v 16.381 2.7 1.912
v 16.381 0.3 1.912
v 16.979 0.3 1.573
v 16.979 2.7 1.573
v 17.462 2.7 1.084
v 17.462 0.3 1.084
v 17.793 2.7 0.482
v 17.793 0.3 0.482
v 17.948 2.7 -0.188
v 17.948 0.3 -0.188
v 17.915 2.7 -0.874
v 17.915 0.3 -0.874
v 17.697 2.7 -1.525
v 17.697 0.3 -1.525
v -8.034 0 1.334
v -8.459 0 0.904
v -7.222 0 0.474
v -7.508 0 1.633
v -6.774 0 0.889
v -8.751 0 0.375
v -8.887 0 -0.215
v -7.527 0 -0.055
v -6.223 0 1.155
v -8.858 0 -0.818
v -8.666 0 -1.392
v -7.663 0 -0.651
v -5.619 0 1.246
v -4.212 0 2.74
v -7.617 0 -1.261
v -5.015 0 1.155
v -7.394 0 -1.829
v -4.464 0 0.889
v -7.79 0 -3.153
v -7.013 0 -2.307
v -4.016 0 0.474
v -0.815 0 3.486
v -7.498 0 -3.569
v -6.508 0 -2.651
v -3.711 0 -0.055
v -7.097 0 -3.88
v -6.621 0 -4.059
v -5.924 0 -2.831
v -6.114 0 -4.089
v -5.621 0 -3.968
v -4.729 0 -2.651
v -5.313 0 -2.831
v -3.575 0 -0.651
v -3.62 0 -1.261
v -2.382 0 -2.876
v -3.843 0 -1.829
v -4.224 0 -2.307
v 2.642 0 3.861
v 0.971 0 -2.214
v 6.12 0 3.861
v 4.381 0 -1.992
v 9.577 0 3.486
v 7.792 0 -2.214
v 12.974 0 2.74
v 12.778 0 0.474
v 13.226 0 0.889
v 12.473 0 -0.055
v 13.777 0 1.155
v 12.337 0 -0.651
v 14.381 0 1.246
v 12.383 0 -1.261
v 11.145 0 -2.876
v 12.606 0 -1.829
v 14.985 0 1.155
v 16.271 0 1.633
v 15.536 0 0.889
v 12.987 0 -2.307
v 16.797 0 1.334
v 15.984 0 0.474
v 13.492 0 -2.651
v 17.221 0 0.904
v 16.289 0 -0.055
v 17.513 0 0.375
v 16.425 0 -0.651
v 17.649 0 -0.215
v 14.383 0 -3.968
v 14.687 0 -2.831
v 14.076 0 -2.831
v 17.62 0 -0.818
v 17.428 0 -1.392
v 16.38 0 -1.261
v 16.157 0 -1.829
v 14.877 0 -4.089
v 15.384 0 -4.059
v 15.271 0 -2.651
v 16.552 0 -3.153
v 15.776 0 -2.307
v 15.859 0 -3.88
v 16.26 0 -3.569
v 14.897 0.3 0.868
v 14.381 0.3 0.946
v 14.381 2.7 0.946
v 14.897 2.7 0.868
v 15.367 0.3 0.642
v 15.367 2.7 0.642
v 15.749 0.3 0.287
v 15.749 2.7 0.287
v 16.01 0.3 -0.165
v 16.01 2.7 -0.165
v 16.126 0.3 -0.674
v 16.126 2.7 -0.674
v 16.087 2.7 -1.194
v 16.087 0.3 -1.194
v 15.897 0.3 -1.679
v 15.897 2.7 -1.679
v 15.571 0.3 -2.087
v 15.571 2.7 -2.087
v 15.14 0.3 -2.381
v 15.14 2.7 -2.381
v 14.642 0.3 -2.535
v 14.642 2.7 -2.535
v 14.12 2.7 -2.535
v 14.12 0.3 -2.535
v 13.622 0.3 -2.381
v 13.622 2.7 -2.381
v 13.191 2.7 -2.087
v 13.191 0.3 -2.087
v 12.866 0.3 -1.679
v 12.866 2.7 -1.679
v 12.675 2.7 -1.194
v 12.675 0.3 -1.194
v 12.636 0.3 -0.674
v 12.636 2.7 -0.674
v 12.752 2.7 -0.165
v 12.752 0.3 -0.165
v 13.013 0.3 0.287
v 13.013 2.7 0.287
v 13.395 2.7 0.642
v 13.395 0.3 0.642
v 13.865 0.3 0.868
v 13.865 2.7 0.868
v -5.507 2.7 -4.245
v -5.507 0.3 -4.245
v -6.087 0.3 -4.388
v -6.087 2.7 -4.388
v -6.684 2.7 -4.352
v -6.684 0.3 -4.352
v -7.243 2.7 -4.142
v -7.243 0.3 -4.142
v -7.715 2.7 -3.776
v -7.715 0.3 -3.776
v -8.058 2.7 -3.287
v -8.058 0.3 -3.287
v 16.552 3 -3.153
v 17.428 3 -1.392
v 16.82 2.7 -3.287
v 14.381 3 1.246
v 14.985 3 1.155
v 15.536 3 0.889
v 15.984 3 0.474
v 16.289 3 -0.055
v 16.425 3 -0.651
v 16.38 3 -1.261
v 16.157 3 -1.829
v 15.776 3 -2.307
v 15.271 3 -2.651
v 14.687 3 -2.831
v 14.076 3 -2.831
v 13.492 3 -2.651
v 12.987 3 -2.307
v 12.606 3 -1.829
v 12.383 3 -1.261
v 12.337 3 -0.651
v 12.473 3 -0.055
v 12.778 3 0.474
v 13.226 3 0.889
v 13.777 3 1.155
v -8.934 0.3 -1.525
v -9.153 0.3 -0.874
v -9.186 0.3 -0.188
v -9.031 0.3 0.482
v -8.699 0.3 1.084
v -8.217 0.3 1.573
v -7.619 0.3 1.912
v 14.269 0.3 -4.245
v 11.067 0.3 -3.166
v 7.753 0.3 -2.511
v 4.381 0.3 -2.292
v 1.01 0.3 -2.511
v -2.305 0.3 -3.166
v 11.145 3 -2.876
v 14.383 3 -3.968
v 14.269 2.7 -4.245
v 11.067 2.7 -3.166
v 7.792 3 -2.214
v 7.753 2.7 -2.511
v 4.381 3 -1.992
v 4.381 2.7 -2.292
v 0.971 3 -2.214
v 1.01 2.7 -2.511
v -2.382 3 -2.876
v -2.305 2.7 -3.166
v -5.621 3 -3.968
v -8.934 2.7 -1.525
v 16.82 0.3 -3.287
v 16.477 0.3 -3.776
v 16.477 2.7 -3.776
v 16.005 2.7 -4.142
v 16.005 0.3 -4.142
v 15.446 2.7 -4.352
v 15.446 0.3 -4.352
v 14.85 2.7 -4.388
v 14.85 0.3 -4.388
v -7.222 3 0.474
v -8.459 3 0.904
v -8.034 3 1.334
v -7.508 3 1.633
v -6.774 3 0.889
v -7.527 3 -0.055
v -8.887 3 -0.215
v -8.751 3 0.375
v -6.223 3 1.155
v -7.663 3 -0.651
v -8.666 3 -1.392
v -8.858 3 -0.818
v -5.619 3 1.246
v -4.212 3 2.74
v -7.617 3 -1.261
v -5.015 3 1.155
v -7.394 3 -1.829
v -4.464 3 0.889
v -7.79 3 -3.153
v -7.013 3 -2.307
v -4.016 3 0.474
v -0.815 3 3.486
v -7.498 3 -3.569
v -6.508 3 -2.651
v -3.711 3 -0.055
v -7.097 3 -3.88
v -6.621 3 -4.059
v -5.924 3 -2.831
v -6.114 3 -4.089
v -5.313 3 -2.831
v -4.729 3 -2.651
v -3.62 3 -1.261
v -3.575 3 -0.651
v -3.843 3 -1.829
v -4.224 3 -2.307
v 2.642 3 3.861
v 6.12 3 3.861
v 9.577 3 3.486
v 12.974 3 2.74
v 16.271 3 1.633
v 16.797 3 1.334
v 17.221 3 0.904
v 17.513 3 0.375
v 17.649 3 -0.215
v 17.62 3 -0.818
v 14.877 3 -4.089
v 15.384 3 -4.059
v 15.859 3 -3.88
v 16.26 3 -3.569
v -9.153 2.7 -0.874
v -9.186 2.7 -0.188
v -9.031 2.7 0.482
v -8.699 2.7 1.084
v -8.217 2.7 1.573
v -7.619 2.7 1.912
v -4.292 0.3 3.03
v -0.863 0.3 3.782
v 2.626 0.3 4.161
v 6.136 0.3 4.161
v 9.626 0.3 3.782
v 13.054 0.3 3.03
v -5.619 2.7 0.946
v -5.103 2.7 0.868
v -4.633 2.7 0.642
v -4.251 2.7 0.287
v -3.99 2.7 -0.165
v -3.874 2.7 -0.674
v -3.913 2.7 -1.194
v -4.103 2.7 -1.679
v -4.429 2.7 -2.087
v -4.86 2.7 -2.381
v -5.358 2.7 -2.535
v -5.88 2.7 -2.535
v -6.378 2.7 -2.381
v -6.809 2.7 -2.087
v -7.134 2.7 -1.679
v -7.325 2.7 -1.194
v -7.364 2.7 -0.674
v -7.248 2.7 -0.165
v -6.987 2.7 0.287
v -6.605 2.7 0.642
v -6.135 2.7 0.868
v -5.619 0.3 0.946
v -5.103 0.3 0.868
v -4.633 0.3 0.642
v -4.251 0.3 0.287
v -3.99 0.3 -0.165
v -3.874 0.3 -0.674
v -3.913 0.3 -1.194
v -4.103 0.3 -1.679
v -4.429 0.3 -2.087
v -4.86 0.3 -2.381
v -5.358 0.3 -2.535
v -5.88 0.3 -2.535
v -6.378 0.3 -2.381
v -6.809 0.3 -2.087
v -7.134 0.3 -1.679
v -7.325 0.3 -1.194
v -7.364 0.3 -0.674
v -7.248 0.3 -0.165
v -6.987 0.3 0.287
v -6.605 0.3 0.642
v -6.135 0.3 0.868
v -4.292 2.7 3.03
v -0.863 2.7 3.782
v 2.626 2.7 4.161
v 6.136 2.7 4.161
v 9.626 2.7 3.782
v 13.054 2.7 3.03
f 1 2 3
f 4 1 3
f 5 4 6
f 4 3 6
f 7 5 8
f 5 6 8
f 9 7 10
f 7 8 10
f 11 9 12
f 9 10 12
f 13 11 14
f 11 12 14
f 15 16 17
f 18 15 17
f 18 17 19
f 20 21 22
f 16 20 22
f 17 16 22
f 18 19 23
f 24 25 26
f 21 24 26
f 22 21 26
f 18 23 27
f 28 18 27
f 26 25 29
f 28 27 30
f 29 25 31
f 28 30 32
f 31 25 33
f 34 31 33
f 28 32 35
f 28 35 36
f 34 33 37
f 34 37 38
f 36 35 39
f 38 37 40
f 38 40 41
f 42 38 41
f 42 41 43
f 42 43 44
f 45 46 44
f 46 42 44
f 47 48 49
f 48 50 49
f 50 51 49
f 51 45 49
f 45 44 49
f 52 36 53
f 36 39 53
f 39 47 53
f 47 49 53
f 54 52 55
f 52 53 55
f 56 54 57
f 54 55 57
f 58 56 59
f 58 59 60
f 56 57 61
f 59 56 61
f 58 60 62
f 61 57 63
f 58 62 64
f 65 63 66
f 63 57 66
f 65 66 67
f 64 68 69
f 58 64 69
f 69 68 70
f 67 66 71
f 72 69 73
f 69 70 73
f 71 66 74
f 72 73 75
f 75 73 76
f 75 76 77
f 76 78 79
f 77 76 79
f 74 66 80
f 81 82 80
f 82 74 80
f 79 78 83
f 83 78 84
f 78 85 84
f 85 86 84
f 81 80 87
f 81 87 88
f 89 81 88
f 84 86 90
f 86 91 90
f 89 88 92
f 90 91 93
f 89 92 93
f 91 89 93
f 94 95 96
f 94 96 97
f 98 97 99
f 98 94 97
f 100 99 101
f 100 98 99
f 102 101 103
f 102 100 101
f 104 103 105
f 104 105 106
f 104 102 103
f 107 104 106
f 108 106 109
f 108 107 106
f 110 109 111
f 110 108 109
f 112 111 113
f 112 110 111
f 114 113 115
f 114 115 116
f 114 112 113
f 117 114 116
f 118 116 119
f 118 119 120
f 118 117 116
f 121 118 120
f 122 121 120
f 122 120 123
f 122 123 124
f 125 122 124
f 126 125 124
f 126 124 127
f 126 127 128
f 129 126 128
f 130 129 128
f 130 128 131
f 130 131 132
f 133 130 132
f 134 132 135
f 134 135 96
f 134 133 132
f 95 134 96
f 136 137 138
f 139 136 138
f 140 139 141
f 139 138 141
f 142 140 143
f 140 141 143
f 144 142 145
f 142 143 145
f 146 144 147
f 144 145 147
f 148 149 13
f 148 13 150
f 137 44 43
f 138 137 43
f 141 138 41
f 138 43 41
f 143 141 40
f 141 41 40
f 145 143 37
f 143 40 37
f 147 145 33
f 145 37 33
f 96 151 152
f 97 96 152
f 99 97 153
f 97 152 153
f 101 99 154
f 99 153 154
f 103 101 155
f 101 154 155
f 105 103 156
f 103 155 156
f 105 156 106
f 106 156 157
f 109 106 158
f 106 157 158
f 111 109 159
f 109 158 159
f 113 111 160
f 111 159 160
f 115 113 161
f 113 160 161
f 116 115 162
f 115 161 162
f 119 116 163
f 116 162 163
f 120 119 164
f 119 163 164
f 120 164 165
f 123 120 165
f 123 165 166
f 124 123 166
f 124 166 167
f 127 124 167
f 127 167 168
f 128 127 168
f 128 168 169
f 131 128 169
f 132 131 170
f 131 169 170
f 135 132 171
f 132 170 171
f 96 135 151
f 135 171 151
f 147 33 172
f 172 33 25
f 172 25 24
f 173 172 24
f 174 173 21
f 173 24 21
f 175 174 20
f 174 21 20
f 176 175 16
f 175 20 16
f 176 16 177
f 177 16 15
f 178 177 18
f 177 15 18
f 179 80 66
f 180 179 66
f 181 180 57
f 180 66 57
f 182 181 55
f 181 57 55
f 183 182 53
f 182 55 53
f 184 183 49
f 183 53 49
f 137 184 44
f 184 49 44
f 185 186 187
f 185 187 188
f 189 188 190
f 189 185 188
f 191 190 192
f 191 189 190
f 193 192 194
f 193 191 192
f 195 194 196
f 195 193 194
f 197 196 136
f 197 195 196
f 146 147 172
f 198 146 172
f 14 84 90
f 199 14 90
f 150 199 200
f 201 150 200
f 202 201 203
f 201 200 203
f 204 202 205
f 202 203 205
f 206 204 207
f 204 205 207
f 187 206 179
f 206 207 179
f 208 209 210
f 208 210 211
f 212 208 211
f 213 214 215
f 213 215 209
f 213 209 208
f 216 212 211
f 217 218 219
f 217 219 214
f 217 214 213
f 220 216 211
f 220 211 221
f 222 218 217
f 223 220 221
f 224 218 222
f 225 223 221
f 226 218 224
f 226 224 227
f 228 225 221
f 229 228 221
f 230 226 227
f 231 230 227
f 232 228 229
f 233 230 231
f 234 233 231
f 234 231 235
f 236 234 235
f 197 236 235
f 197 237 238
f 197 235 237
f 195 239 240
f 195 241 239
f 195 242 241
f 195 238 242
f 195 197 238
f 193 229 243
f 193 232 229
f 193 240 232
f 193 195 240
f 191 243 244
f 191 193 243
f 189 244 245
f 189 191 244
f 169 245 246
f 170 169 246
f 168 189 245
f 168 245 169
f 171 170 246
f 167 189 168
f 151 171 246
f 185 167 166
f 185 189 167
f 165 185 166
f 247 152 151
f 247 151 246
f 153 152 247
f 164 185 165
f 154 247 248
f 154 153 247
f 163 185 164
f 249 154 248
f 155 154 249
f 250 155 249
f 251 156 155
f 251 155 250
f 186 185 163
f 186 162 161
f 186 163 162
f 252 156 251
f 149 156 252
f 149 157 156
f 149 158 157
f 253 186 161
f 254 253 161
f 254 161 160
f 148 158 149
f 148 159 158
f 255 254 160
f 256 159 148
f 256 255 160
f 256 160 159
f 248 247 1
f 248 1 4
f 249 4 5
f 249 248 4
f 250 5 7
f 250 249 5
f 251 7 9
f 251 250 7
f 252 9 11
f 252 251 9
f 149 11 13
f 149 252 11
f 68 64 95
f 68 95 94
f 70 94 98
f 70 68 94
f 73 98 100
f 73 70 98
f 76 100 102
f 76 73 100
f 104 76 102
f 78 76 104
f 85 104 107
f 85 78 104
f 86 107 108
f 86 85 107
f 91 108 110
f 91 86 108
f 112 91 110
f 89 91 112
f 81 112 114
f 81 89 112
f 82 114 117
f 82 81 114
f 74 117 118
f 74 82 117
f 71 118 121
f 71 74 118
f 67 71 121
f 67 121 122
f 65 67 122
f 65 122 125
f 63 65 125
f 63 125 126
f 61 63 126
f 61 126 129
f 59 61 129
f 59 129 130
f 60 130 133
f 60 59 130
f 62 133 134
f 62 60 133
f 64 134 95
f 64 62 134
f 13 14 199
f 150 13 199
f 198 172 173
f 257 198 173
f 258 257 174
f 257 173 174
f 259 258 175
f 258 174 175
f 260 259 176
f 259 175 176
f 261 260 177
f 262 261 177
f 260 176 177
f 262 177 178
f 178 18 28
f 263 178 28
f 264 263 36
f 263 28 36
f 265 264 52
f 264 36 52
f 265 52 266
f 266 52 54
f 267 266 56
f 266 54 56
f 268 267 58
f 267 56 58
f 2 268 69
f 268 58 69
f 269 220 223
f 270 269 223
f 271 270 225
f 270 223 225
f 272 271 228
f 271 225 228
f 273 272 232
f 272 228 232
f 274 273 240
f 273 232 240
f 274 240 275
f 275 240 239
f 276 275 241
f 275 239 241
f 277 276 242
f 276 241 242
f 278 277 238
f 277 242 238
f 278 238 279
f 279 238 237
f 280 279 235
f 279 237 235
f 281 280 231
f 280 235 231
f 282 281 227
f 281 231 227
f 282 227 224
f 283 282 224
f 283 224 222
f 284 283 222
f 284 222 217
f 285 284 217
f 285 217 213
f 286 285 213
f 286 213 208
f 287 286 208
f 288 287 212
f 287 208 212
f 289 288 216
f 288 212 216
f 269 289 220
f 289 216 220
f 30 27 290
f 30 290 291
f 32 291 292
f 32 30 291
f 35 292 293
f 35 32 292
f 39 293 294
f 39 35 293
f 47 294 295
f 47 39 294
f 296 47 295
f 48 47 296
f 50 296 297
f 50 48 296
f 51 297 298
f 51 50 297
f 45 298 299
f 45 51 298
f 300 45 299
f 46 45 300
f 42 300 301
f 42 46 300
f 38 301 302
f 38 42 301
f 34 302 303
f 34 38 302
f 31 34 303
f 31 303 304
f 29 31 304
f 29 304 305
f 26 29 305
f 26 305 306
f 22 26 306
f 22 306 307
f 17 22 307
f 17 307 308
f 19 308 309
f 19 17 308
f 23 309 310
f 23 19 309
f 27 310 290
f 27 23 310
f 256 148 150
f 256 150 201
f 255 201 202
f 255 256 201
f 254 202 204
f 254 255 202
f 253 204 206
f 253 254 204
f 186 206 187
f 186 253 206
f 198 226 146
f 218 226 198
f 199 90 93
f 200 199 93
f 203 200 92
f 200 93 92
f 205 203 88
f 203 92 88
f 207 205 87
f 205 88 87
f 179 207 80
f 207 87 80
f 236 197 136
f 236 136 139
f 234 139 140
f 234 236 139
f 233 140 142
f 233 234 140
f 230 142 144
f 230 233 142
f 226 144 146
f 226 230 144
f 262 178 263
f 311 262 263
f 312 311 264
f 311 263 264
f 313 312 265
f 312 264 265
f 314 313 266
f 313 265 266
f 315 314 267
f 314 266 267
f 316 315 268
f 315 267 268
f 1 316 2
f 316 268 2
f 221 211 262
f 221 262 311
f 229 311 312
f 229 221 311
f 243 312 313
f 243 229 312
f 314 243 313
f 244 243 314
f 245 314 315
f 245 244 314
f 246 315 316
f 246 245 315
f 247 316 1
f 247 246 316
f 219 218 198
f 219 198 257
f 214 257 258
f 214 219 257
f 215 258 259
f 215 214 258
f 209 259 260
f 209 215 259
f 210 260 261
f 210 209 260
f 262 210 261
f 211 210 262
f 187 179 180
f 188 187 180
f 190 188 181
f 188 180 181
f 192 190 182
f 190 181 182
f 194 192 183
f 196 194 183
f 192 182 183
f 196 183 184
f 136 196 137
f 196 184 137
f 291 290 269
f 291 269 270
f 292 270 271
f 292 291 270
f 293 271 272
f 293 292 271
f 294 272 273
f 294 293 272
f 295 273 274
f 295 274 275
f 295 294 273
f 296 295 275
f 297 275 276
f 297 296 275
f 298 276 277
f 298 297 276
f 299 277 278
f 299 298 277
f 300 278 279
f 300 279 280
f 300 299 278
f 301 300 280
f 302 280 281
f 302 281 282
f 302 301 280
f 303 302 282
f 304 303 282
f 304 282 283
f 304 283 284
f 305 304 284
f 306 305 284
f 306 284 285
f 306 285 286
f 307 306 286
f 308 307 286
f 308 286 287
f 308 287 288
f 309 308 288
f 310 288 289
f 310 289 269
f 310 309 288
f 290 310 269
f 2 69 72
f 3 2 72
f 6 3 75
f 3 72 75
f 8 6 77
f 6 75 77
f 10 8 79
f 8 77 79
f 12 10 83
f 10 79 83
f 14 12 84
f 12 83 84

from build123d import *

# Parameters (mm, degrees)
SKETCH_1_R      = 1.75
EXTRUDE_1_DEPTH = 3
CHAMFER_1_SIZE  = 0.3


with BuildPart() as part:
    # 草图1 → 凸台-拉伸1 (new body)
    with BuildSketch(Plane(origin=(0, 0, 0), x_dir=(1, 0, 0), z_dir=(0, 1, 0))):
        with BuildLine():
            Line((-8.058099854, 3.286572102), (-8.934273675, 1.52529864))
            ThreePointArc((-8.934273675, 1.52529864), (-9.030809196, -0.481724252), (-7.6190352, -1.911533393))
            ThreePointArc((-7.6190352, -1.911533393), (4.381181498, -4.208142868), (16.381398197, -1.911533393))
            ThreePointArc((16.381398197, -1.911533393), (17.793172193, -0.481724252), (17.696636672, 1.52529864))
            Line((17.696636672, 1.52529864), (16.820462851, 3.286572102))
            ThreePointArc((16.820462851, 3.286572102), (15.733455475, 4.267905138), (14.26918179, 4.245496696))
            ThreePointArc((14.26918179, 4.245496696), (4.381181498, 2.291857132), (-5.506818793, 4.245496696))
            ThreePointArc((-5.506818793, 4.245496696), (-6.971092478, 4.267905138), (-8.058099854, 3.286572102))
        make_face()
        with Locations(Location((-5.618818502, 0.804359974, 0), (0, 0, 270))):
            Circle(SKETCH_1_R, mode=Mode.SUBTRACT)
        with Locations(Location((14.381181498, 0.804359974, 0), (0, 0, 270))):
            Circle(SKETCH_1_R, mode=Mode.SUBTRACT)
    extrude(amount=EXTRUDE_1_DEPTH)

    # 倒角1
    chamfer_1_edges = [part.edges().sort_by_distance(p)[0] for p in [
        (4.381181498, 0, -2.291857132),
        (15.733455475, 0, -4.267905138),
        (17.258549762, 0, -2.405935371),
        (17.793172193, 0, 0.481724252),
        (15.733455475, 3, -4.267905138),
        (4.381181498, 3, -2.291857132),
        (-6.971092478, 3, -4.267905138),
        (-5.618818502, 0, -2.554359974),
        (-5.618818502, 3, -2.554359974),
        (-8.496186765, 3, -2.405935371),
        (14.381181498, 0, -2.554359974),
        (14.381181498, 3, -2.554359974),
        (-9.030809196, 3, 0.481724252),
        (4.381181498, 3, 4.208142868),
        (17.793172193, 3, 0.481724252),
        (4.381181498, 0, 4.208142868),
        (17.258549762, 3, -2.405935371),
        (-9.030809196, 0, 0.481724252),
        (-8.496186765, 0, -2.405935371),
        (-6.971092478, 0, -4.267905138),
    ]]
    chamfer(chamfer_1_edges, length=CHAMFER_1_SIZE)


solid = part.part
